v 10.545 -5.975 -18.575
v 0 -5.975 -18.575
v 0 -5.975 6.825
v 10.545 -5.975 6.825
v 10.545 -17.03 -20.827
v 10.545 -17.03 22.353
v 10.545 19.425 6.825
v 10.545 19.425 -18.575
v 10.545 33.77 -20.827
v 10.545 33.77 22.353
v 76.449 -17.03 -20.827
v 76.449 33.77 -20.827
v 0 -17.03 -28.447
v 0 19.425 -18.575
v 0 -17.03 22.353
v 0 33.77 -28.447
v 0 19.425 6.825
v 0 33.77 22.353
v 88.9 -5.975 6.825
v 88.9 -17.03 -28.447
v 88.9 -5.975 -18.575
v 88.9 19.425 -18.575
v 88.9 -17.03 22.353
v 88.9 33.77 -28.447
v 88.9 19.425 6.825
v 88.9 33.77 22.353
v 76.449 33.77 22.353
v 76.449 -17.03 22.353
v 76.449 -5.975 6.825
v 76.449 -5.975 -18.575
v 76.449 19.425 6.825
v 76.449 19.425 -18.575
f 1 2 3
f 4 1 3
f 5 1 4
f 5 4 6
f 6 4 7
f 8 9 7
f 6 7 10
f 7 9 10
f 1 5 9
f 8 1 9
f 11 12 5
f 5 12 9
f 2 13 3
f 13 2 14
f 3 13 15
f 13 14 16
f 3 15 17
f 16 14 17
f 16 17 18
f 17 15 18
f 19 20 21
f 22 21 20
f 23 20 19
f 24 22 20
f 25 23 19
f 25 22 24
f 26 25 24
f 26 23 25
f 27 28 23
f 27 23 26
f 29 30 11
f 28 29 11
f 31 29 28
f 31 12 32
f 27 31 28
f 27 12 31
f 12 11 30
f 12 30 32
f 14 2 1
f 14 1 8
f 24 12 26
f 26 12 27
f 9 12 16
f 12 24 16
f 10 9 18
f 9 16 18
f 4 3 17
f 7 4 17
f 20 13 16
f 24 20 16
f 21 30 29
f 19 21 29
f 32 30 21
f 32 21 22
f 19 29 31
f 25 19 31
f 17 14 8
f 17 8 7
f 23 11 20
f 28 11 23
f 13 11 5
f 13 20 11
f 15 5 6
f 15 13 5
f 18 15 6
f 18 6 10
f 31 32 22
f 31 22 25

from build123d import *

# Parameters (mm, degrees)
F0_W     = 50.8
F0_H     = 50.8
F0_W_2   = 25.4
F0_H_2   = 25.4
F1_DEPTH = 88.9
F2_W     = 65.903696
F2_H     = 43.18
F3_DEPTH = 50.8


with BuildPart() as f1:
    # F0 (on Right) → F1 (new body)
    with BuildSketch(Plane.YZ):
        with Locations((8.370453, -3.046589)):
            Rectangle(F0_W, F0_H)
        with Locations((6.725227, -5.875227)):
            Rectangle(F0_W_2, F0_H_2, mode=Mode.SUBTRACT)
    extrude(amount=F1_DEPTH)

    # F2 (on face) → F3 (cut)
    with BuildSketch(Plane(origin=(0, 33.770453, 0), x_dir=(-1, 0, 0), z_dir=(0, 1, 0))):
        with Locations((-43.497203, 0.763411)):
            Rectangle(F2_W, F2_H)
    extrude(amount=-F3_DEPTH, mode=Mode.SUBTRACT)


solid = f1.part
